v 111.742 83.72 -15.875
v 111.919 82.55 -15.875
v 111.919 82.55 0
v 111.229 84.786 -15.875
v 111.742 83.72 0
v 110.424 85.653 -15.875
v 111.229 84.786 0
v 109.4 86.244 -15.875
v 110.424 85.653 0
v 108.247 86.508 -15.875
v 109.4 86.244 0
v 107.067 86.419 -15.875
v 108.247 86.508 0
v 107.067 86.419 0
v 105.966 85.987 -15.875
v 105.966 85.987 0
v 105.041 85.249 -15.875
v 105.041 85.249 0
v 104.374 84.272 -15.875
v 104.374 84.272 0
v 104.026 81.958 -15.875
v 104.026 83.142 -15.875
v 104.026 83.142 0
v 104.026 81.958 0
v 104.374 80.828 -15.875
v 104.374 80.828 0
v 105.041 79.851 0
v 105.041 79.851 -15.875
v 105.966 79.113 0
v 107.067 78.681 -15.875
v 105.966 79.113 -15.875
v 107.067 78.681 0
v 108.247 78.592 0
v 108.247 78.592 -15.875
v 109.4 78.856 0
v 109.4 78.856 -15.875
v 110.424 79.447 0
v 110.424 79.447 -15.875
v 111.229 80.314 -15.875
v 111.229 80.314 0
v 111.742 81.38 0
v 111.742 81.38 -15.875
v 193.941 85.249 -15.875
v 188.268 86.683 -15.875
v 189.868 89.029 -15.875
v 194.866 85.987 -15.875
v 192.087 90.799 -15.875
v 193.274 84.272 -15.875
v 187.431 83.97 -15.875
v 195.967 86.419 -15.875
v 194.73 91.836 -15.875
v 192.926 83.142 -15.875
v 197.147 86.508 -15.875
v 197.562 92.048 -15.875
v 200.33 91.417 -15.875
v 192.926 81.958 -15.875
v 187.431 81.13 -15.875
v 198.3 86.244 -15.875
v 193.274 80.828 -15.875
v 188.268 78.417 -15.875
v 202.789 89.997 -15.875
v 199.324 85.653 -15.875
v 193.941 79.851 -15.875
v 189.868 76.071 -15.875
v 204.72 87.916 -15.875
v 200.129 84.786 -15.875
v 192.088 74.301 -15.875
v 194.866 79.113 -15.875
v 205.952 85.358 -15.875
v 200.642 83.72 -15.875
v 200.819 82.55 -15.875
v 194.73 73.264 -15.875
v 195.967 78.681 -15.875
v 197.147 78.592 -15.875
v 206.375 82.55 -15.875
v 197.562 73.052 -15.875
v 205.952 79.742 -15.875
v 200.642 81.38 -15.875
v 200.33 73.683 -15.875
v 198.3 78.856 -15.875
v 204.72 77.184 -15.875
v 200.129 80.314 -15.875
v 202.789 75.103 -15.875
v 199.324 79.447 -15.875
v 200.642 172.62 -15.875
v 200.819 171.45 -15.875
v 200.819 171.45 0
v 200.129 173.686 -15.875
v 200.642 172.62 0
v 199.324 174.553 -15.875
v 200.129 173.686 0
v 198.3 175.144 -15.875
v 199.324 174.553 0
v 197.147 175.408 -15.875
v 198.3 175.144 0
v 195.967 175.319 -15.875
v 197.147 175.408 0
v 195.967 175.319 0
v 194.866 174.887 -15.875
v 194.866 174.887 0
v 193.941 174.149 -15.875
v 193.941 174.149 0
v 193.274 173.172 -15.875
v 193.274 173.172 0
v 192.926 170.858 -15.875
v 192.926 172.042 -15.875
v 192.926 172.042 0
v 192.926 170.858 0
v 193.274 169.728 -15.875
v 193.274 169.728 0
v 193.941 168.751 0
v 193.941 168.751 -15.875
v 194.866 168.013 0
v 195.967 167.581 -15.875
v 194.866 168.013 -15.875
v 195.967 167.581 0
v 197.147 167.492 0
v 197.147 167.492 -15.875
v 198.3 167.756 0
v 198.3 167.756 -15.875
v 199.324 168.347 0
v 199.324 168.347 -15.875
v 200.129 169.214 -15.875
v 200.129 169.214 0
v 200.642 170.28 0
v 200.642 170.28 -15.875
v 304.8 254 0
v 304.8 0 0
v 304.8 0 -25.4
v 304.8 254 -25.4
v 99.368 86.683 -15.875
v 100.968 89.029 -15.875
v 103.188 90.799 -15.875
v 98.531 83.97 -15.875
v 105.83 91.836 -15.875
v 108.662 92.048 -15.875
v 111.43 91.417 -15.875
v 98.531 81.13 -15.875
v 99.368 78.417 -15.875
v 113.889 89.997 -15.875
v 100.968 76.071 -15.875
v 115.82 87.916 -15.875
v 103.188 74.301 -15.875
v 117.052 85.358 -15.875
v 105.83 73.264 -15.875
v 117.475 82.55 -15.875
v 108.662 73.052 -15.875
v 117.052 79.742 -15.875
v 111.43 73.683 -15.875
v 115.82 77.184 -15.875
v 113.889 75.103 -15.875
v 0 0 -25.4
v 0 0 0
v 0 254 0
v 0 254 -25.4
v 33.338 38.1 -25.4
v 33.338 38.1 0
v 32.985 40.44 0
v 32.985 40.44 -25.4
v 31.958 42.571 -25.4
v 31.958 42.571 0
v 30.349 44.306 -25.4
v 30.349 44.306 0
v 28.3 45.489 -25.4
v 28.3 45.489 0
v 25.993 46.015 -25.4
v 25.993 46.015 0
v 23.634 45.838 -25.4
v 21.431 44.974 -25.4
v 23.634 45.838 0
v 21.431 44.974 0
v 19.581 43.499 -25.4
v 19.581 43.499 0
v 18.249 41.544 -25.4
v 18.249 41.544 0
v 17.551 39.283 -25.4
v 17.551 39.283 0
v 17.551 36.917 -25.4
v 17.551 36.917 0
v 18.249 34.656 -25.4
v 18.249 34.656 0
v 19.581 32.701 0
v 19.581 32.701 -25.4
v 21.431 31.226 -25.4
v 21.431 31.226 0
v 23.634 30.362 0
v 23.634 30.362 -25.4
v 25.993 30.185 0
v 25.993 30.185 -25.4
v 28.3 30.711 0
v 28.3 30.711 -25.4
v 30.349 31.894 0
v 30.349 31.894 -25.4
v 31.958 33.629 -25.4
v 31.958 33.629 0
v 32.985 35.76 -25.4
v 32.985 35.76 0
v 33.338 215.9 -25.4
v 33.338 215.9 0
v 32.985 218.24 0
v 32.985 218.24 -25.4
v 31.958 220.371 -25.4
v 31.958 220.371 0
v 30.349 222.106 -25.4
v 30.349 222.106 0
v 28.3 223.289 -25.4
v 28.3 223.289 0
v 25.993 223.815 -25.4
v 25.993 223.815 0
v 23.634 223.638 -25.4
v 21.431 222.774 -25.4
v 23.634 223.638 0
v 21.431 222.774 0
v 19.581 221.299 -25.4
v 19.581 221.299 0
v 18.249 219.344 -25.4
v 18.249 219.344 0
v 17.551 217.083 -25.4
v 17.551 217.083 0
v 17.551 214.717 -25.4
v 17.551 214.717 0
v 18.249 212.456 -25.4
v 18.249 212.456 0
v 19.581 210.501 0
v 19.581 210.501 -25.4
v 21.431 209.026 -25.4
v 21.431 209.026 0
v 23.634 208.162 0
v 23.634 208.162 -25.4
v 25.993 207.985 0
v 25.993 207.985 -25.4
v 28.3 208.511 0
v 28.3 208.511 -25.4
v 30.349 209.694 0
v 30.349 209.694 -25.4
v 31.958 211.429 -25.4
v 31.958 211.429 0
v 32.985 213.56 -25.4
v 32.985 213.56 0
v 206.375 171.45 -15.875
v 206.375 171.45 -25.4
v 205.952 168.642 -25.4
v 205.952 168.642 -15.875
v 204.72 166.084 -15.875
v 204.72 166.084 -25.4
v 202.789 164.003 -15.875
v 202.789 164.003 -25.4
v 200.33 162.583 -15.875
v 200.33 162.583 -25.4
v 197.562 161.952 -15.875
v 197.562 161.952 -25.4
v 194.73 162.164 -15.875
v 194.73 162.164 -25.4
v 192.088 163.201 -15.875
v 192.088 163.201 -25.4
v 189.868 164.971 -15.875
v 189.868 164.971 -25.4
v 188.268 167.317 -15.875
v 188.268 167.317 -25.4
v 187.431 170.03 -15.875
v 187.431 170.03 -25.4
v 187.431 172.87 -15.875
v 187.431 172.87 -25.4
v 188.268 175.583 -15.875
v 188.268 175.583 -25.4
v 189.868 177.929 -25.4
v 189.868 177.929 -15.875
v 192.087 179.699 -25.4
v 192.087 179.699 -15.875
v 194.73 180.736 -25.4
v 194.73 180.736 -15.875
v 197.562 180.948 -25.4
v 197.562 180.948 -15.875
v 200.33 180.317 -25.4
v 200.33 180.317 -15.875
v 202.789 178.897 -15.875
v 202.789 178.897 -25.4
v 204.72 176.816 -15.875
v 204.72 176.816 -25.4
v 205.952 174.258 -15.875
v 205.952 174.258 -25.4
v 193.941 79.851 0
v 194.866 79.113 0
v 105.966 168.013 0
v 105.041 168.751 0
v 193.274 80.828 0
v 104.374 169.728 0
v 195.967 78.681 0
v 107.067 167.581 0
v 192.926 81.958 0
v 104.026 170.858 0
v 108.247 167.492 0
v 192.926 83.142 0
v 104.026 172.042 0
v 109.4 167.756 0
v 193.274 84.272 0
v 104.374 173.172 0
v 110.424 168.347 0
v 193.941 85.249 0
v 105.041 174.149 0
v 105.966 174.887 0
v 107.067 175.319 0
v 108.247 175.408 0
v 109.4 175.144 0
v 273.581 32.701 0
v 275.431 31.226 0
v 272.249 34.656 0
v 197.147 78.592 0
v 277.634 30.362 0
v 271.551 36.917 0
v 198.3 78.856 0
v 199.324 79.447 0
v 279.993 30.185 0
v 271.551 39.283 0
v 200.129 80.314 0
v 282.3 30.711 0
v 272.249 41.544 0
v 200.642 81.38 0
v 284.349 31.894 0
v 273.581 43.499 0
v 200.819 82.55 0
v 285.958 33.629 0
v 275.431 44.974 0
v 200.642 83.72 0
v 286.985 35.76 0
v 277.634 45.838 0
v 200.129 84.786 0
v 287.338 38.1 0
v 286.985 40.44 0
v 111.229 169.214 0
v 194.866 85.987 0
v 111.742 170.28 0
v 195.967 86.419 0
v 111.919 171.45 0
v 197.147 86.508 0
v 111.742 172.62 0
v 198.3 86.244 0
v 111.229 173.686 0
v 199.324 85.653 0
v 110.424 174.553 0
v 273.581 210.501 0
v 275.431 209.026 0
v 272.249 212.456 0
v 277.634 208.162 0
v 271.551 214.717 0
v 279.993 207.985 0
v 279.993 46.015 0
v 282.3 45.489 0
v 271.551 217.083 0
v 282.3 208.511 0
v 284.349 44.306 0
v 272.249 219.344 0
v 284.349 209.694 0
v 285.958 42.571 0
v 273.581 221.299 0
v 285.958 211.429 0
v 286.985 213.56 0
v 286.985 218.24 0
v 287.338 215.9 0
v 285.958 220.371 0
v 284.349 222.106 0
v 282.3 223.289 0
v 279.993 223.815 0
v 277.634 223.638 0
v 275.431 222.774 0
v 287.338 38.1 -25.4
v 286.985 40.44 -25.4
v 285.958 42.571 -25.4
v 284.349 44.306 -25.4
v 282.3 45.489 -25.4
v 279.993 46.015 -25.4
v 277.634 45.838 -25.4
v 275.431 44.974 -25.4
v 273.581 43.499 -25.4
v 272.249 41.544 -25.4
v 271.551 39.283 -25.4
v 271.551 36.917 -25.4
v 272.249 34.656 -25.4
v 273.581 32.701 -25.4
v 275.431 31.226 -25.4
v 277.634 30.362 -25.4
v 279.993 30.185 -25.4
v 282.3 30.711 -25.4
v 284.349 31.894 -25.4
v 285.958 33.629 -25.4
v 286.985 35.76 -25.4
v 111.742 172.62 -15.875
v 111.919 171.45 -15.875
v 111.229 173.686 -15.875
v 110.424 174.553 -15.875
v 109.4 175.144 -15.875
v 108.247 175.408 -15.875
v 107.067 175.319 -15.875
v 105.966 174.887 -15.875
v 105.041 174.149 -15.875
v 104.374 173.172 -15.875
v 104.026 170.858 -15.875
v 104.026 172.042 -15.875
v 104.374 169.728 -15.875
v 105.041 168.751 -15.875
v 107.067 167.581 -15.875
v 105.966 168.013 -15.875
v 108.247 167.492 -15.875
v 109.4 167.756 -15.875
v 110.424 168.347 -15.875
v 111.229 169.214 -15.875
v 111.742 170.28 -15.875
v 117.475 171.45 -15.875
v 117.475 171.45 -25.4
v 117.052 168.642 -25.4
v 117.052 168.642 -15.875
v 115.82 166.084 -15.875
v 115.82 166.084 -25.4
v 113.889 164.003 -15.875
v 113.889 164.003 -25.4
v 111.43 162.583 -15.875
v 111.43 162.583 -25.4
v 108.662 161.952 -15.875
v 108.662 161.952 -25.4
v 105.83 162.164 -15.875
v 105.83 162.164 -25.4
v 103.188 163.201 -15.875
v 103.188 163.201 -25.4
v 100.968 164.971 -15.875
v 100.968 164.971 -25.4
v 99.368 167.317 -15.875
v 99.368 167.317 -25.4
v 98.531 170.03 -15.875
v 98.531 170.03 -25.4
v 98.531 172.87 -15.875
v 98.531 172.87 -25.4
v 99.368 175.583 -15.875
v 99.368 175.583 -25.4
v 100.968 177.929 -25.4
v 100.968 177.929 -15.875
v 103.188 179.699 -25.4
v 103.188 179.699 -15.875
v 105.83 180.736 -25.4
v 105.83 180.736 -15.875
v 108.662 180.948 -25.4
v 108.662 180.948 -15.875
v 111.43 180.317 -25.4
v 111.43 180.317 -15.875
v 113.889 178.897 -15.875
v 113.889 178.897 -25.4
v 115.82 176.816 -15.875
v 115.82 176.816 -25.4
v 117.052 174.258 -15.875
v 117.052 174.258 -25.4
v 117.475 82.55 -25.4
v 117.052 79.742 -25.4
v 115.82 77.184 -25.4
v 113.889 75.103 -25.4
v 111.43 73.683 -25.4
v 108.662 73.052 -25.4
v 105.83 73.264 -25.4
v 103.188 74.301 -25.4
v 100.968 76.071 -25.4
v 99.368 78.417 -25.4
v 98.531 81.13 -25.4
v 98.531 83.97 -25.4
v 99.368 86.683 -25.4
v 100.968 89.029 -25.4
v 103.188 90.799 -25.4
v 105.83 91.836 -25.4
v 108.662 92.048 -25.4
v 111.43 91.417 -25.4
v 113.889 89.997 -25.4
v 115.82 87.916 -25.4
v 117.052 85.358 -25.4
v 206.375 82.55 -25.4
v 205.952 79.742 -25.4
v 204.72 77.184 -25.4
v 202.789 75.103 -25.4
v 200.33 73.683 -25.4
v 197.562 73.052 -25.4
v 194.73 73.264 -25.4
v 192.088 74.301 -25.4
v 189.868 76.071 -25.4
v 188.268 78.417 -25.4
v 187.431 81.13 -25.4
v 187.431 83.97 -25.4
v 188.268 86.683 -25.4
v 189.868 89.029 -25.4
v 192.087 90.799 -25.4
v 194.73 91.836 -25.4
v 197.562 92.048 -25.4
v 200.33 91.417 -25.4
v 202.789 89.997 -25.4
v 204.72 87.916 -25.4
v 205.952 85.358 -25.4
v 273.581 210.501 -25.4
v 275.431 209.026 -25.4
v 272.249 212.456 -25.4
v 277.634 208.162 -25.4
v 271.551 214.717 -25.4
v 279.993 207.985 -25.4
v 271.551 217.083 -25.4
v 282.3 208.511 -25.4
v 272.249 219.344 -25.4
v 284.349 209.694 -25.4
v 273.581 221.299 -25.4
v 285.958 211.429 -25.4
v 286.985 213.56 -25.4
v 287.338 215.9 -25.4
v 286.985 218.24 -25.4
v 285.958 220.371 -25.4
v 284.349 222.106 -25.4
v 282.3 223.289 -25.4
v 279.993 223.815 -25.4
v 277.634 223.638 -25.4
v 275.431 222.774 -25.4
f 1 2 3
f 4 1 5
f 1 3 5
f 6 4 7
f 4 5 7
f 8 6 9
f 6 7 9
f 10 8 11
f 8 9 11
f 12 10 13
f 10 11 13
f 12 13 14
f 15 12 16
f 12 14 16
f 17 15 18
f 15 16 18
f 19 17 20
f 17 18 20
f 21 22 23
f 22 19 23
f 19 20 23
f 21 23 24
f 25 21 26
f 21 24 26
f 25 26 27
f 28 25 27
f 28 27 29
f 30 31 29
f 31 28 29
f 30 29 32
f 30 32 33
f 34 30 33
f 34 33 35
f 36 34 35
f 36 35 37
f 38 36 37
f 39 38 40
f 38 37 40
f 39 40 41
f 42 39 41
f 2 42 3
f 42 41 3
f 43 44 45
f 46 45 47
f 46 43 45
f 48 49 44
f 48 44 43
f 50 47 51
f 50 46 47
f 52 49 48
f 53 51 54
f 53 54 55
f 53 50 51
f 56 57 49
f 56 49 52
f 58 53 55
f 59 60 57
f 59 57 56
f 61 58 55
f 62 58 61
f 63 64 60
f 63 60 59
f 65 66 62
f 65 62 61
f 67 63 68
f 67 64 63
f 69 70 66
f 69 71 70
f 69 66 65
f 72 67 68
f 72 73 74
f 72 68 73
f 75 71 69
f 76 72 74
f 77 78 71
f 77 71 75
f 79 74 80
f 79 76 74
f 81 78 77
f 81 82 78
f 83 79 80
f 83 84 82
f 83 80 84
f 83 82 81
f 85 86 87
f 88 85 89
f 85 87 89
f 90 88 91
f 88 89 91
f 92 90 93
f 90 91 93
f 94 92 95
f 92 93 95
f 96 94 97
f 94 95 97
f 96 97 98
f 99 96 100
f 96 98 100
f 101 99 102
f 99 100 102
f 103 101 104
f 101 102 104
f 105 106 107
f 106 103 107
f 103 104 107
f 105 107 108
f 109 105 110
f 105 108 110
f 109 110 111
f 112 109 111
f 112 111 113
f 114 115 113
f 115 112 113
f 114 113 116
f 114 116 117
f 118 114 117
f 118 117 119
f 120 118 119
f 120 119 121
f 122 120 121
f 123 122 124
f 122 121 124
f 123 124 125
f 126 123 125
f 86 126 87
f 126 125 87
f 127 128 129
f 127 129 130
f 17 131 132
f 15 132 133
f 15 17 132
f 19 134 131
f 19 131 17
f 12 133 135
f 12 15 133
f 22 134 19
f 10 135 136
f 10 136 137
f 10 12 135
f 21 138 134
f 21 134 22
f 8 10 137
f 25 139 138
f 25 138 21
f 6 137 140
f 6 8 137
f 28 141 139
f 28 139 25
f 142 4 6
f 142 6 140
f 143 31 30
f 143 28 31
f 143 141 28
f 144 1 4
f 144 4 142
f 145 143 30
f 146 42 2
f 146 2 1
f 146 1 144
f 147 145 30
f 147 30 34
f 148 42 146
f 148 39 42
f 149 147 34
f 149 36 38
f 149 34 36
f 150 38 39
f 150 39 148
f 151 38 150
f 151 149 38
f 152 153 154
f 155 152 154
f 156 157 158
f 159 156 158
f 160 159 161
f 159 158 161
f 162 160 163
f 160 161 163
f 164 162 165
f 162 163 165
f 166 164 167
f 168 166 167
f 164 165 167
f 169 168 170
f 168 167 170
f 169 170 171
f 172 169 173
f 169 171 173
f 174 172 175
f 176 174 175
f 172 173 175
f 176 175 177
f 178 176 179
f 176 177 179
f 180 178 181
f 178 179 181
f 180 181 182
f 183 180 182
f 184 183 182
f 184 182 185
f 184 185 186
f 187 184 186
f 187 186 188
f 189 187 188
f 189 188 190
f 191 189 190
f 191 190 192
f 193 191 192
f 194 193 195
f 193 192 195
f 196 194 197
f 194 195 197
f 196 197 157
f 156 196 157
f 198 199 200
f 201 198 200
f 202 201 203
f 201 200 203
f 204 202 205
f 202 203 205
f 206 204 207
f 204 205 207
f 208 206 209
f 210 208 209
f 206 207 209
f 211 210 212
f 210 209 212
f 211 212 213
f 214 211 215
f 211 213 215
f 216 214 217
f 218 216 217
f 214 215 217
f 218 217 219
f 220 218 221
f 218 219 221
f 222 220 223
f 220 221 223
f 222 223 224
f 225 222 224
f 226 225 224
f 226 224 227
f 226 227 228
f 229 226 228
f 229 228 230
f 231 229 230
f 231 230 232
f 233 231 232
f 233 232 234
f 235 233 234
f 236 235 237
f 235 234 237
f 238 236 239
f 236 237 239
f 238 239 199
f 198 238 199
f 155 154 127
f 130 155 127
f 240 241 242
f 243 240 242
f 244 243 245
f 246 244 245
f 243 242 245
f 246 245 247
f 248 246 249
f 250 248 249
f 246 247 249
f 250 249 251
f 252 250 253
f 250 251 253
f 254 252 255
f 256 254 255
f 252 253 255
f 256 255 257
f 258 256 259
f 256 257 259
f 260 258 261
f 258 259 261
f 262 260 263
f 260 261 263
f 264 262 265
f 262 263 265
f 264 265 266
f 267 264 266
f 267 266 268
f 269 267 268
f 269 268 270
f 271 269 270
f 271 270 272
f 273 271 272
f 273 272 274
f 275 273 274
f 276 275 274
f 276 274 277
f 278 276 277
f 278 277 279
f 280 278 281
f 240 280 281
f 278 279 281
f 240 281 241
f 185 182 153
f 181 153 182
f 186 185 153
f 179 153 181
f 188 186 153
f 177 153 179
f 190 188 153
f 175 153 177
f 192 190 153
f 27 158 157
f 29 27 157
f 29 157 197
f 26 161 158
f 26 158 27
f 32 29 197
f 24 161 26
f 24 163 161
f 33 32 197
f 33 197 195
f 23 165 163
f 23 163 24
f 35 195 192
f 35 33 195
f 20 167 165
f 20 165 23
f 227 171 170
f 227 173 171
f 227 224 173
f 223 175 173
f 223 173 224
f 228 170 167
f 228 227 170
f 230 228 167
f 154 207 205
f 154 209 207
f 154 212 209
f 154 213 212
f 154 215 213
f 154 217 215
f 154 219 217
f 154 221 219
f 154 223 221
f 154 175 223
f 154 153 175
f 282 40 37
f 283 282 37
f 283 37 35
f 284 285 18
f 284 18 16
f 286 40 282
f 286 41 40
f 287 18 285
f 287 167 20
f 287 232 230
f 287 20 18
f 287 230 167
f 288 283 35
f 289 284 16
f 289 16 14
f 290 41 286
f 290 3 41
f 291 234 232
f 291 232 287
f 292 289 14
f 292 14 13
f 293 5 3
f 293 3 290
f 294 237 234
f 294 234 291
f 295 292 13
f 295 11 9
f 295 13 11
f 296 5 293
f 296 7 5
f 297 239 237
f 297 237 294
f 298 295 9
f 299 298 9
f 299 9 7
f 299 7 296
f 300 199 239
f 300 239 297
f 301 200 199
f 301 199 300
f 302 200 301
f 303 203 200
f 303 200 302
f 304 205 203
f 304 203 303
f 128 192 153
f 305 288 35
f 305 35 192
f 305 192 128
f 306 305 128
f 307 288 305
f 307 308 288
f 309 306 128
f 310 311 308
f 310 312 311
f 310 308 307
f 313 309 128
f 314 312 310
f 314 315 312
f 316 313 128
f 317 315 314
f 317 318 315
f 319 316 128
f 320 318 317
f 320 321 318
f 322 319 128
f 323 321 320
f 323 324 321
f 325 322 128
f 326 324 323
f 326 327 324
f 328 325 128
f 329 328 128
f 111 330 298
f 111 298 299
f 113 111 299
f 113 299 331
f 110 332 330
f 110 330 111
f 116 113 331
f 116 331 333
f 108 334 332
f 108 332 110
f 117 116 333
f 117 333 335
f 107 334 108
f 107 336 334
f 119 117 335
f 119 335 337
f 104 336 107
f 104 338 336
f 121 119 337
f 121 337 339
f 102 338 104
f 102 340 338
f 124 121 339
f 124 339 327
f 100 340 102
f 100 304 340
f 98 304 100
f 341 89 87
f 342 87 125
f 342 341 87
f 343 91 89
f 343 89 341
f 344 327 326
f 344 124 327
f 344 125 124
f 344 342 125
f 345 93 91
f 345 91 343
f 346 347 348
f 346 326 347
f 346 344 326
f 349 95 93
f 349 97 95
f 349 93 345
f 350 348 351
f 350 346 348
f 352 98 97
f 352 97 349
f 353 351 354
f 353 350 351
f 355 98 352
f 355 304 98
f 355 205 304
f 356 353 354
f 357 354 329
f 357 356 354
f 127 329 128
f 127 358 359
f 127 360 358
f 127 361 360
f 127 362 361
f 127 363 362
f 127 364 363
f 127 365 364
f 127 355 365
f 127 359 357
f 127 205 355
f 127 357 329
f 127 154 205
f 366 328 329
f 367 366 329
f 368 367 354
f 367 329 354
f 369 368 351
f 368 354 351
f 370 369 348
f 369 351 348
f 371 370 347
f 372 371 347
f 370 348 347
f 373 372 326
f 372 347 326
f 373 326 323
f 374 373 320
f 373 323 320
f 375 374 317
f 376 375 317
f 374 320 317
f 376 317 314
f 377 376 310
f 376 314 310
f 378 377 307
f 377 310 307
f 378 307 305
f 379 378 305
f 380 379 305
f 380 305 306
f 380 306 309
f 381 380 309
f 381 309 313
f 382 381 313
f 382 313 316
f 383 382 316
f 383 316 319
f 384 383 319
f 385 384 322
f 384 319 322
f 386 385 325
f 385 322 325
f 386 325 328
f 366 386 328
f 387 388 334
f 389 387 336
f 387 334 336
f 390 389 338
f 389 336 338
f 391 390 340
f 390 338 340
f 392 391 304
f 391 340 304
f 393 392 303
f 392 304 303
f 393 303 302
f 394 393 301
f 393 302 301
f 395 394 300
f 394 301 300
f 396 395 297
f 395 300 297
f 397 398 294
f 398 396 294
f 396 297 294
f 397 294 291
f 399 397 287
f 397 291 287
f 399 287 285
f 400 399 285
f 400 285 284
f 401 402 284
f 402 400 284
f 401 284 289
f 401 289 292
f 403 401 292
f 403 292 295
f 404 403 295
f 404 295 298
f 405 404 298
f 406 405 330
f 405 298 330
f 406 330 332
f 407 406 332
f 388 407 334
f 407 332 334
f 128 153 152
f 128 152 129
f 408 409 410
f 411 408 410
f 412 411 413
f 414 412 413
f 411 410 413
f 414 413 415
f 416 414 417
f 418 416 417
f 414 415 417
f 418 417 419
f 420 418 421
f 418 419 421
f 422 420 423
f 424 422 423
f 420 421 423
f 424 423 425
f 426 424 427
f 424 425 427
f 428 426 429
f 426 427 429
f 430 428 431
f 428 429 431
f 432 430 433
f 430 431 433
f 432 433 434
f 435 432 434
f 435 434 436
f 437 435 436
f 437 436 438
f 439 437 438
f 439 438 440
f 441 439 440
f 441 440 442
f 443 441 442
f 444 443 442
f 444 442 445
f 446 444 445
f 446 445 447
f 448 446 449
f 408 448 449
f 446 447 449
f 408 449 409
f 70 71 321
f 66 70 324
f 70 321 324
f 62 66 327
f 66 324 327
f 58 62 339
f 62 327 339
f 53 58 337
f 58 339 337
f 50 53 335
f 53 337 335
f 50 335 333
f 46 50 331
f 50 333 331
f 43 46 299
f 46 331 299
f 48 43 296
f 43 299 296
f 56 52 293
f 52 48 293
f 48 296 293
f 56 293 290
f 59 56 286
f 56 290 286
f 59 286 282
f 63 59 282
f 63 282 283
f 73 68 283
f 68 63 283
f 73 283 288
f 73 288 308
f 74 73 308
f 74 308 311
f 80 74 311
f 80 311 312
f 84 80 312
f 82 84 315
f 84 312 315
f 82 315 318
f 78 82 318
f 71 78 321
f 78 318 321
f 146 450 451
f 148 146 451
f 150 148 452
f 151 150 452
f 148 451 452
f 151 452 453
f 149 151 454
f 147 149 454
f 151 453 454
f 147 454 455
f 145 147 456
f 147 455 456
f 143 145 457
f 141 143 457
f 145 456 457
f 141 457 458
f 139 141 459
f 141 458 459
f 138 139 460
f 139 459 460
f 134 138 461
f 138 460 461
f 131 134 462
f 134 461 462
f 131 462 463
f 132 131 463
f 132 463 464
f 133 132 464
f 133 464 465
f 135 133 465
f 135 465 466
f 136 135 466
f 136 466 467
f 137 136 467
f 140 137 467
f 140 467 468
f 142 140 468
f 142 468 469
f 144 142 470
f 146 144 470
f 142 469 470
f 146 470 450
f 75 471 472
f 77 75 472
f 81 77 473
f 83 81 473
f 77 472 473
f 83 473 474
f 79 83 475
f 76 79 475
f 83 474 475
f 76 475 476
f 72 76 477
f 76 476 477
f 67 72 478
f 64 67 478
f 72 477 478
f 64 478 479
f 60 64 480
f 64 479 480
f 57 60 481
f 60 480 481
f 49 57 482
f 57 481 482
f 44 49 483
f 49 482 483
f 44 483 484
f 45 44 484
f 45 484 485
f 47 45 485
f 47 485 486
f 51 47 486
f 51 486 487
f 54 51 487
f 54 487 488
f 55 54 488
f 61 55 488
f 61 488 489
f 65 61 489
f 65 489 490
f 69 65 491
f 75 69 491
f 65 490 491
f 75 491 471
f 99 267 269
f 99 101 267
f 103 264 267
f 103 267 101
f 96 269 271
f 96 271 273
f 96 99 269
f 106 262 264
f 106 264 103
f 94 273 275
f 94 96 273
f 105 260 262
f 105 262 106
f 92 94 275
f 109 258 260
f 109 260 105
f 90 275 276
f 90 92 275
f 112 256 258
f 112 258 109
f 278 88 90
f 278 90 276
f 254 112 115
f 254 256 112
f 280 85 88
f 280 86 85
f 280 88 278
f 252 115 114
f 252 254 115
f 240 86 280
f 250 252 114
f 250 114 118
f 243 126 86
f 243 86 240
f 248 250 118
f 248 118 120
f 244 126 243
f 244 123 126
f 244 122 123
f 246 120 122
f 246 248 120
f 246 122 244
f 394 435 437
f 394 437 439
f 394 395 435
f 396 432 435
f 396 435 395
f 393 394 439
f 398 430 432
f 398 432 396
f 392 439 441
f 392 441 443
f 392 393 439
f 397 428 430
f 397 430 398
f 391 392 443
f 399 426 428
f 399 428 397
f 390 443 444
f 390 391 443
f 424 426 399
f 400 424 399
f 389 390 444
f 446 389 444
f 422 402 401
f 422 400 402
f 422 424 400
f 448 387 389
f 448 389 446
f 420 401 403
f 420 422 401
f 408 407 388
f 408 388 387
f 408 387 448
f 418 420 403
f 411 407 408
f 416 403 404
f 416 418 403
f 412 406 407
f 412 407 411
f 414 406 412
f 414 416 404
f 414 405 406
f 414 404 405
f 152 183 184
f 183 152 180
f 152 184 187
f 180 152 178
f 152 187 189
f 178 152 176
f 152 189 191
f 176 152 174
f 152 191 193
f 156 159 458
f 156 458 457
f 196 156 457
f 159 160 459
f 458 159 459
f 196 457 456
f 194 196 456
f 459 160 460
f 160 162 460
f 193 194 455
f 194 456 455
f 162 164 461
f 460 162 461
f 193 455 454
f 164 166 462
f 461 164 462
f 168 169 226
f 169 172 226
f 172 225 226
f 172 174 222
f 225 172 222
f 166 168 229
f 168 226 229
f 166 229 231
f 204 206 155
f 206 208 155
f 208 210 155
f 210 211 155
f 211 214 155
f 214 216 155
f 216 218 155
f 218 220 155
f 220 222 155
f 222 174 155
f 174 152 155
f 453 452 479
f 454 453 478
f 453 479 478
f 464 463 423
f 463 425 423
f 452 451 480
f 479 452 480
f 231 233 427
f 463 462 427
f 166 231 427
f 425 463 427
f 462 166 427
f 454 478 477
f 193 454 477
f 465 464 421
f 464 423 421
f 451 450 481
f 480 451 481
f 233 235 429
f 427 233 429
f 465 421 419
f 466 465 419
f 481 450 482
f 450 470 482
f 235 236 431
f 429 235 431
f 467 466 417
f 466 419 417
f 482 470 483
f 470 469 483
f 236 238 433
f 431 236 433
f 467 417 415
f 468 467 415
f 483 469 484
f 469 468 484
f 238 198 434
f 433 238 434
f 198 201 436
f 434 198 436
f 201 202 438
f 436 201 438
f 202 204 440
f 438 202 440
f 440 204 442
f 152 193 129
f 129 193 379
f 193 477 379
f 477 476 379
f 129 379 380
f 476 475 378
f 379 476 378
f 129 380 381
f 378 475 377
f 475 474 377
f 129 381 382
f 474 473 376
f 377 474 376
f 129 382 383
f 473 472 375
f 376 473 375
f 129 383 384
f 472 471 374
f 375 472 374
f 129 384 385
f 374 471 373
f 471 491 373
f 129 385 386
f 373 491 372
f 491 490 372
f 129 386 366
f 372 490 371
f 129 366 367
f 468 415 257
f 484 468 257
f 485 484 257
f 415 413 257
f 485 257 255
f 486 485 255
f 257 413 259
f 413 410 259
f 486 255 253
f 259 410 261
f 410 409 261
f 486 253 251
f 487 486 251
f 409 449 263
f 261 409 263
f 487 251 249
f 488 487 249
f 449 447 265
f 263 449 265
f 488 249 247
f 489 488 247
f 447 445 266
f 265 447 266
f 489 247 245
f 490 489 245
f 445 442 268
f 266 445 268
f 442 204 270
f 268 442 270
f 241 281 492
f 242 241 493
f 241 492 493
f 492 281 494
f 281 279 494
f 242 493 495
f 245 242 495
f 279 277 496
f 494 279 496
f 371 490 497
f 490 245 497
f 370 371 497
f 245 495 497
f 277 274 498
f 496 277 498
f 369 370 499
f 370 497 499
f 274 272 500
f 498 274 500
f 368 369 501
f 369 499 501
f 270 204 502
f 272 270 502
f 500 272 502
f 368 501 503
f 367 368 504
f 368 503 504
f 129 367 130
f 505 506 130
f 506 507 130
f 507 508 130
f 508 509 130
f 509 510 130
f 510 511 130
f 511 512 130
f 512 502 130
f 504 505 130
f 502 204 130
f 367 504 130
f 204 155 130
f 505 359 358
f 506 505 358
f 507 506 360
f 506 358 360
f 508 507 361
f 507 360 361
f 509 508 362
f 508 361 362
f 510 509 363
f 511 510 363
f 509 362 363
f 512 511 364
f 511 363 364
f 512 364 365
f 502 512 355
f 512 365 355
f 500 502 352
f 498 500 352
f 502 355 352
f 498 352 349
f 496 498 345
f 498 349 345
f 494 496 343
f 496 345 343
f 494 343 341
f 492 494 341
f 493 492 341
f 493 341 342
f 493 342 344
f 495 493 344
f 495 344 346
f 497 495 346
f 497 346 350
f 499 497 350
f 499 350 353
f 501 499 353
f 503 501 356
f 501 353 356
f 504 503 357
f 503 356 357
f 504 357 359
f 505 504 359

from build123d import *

# Parameters (mm, degrees)
F0_W     = 304.8
F0_H     = 254
F1_DEPTH = 25.4
F2_R     = 3.96875
F3_DEPTH = 25.4
F4_R     = 9.525
F4_R_2   = 3.96875
F5_DEPTH = 9.525
F2_R_2   = 7.9375
F6_DEPTH = 25.4


with BuildPart() as f1:
    # F0 (on Top) → F1 (new body)
    with BuildSketch(Plane.XY):
        with Locations((152.4, 127)):
            Rectangle(F0_W, F0_H)
    extrude(amount=-F1_DEPTH)

    # F2 (on face) → F3 (cut)
    with BuildSketch(Plane.XY):
        with Locations((107.95, 171.45)):
            Circle(F2_R)
        with Locations((196.85, 171.45)):
            Circle(F2_R)
        with Locations((196.85, 82.55)):
            Circle(F2_R)
        with Locations((107.95, 82.55)):
            Circle(F2_R)
    extrude(amount=-F3_DEPTH, mode=Mode.SUBTRACT)

    # F4 (on face) → F5 (cut)
    with BuildSketch(Plane(origin=(0, 0, -25.4), x_dir=(1, 0, 0), z_dir=(0, 0, -1))):
        with Locations((107.95, -171.45)):
            Circle(F4_R)
        with Locations((107.95, -171.45)):
            Circle(F4_R_2, mode=Mode.SUBTRACT)
        with Locations((196.85, -171.45)):
            Circle(F4_R)
        with Locations((196.85, -171.45)):
            Circle(F4_R_2, mode=Mode.SUBTRACT)
        with Locations((107.95, -82.55)):
            Circle(F4_R)
        with Locations((107.95, -82.55)):
            Circle(F4_R_2, mode=Mode.SUBTRACT)
        with Locations((196.85, -82.55)):
            Circle(F4_R)
        with Locations((196.85, -82.55)):
            Circle(F4_R_2, mode=Mode.SUBTRACT)
    extrude(amount=-F5_DEPTH, mode=Mode.SUBTRACT)

    # F2 (on face) → F6 (cut)
    with BuildSketch(Plane.XY):
        with Locations((107.95, 171.45)):
            Circle(F2_R)
        with Locations((196.85, 171.45)):
            Circle(F2_R)
        with Locations((107.95, 82.55)):
            Circle(F2_R)
        with Locations((196.85, 82.55)):
            Circle(F2_R)
        with Locations((25.4, 215.9)):
            Circle(F2_R_2)
        with Locations((279.4, 215.9)):
            Circle(F2_R_2)
        with Locations((279.4, 38.1)):
            Circle(F2_R_2)
        with Locations((25.4, 38.1)):
            Circle(F2_R_2)
    extrude(amount=-F6_DEPTH, mode=Mode.SUBTRACT)


solid = f1.part
